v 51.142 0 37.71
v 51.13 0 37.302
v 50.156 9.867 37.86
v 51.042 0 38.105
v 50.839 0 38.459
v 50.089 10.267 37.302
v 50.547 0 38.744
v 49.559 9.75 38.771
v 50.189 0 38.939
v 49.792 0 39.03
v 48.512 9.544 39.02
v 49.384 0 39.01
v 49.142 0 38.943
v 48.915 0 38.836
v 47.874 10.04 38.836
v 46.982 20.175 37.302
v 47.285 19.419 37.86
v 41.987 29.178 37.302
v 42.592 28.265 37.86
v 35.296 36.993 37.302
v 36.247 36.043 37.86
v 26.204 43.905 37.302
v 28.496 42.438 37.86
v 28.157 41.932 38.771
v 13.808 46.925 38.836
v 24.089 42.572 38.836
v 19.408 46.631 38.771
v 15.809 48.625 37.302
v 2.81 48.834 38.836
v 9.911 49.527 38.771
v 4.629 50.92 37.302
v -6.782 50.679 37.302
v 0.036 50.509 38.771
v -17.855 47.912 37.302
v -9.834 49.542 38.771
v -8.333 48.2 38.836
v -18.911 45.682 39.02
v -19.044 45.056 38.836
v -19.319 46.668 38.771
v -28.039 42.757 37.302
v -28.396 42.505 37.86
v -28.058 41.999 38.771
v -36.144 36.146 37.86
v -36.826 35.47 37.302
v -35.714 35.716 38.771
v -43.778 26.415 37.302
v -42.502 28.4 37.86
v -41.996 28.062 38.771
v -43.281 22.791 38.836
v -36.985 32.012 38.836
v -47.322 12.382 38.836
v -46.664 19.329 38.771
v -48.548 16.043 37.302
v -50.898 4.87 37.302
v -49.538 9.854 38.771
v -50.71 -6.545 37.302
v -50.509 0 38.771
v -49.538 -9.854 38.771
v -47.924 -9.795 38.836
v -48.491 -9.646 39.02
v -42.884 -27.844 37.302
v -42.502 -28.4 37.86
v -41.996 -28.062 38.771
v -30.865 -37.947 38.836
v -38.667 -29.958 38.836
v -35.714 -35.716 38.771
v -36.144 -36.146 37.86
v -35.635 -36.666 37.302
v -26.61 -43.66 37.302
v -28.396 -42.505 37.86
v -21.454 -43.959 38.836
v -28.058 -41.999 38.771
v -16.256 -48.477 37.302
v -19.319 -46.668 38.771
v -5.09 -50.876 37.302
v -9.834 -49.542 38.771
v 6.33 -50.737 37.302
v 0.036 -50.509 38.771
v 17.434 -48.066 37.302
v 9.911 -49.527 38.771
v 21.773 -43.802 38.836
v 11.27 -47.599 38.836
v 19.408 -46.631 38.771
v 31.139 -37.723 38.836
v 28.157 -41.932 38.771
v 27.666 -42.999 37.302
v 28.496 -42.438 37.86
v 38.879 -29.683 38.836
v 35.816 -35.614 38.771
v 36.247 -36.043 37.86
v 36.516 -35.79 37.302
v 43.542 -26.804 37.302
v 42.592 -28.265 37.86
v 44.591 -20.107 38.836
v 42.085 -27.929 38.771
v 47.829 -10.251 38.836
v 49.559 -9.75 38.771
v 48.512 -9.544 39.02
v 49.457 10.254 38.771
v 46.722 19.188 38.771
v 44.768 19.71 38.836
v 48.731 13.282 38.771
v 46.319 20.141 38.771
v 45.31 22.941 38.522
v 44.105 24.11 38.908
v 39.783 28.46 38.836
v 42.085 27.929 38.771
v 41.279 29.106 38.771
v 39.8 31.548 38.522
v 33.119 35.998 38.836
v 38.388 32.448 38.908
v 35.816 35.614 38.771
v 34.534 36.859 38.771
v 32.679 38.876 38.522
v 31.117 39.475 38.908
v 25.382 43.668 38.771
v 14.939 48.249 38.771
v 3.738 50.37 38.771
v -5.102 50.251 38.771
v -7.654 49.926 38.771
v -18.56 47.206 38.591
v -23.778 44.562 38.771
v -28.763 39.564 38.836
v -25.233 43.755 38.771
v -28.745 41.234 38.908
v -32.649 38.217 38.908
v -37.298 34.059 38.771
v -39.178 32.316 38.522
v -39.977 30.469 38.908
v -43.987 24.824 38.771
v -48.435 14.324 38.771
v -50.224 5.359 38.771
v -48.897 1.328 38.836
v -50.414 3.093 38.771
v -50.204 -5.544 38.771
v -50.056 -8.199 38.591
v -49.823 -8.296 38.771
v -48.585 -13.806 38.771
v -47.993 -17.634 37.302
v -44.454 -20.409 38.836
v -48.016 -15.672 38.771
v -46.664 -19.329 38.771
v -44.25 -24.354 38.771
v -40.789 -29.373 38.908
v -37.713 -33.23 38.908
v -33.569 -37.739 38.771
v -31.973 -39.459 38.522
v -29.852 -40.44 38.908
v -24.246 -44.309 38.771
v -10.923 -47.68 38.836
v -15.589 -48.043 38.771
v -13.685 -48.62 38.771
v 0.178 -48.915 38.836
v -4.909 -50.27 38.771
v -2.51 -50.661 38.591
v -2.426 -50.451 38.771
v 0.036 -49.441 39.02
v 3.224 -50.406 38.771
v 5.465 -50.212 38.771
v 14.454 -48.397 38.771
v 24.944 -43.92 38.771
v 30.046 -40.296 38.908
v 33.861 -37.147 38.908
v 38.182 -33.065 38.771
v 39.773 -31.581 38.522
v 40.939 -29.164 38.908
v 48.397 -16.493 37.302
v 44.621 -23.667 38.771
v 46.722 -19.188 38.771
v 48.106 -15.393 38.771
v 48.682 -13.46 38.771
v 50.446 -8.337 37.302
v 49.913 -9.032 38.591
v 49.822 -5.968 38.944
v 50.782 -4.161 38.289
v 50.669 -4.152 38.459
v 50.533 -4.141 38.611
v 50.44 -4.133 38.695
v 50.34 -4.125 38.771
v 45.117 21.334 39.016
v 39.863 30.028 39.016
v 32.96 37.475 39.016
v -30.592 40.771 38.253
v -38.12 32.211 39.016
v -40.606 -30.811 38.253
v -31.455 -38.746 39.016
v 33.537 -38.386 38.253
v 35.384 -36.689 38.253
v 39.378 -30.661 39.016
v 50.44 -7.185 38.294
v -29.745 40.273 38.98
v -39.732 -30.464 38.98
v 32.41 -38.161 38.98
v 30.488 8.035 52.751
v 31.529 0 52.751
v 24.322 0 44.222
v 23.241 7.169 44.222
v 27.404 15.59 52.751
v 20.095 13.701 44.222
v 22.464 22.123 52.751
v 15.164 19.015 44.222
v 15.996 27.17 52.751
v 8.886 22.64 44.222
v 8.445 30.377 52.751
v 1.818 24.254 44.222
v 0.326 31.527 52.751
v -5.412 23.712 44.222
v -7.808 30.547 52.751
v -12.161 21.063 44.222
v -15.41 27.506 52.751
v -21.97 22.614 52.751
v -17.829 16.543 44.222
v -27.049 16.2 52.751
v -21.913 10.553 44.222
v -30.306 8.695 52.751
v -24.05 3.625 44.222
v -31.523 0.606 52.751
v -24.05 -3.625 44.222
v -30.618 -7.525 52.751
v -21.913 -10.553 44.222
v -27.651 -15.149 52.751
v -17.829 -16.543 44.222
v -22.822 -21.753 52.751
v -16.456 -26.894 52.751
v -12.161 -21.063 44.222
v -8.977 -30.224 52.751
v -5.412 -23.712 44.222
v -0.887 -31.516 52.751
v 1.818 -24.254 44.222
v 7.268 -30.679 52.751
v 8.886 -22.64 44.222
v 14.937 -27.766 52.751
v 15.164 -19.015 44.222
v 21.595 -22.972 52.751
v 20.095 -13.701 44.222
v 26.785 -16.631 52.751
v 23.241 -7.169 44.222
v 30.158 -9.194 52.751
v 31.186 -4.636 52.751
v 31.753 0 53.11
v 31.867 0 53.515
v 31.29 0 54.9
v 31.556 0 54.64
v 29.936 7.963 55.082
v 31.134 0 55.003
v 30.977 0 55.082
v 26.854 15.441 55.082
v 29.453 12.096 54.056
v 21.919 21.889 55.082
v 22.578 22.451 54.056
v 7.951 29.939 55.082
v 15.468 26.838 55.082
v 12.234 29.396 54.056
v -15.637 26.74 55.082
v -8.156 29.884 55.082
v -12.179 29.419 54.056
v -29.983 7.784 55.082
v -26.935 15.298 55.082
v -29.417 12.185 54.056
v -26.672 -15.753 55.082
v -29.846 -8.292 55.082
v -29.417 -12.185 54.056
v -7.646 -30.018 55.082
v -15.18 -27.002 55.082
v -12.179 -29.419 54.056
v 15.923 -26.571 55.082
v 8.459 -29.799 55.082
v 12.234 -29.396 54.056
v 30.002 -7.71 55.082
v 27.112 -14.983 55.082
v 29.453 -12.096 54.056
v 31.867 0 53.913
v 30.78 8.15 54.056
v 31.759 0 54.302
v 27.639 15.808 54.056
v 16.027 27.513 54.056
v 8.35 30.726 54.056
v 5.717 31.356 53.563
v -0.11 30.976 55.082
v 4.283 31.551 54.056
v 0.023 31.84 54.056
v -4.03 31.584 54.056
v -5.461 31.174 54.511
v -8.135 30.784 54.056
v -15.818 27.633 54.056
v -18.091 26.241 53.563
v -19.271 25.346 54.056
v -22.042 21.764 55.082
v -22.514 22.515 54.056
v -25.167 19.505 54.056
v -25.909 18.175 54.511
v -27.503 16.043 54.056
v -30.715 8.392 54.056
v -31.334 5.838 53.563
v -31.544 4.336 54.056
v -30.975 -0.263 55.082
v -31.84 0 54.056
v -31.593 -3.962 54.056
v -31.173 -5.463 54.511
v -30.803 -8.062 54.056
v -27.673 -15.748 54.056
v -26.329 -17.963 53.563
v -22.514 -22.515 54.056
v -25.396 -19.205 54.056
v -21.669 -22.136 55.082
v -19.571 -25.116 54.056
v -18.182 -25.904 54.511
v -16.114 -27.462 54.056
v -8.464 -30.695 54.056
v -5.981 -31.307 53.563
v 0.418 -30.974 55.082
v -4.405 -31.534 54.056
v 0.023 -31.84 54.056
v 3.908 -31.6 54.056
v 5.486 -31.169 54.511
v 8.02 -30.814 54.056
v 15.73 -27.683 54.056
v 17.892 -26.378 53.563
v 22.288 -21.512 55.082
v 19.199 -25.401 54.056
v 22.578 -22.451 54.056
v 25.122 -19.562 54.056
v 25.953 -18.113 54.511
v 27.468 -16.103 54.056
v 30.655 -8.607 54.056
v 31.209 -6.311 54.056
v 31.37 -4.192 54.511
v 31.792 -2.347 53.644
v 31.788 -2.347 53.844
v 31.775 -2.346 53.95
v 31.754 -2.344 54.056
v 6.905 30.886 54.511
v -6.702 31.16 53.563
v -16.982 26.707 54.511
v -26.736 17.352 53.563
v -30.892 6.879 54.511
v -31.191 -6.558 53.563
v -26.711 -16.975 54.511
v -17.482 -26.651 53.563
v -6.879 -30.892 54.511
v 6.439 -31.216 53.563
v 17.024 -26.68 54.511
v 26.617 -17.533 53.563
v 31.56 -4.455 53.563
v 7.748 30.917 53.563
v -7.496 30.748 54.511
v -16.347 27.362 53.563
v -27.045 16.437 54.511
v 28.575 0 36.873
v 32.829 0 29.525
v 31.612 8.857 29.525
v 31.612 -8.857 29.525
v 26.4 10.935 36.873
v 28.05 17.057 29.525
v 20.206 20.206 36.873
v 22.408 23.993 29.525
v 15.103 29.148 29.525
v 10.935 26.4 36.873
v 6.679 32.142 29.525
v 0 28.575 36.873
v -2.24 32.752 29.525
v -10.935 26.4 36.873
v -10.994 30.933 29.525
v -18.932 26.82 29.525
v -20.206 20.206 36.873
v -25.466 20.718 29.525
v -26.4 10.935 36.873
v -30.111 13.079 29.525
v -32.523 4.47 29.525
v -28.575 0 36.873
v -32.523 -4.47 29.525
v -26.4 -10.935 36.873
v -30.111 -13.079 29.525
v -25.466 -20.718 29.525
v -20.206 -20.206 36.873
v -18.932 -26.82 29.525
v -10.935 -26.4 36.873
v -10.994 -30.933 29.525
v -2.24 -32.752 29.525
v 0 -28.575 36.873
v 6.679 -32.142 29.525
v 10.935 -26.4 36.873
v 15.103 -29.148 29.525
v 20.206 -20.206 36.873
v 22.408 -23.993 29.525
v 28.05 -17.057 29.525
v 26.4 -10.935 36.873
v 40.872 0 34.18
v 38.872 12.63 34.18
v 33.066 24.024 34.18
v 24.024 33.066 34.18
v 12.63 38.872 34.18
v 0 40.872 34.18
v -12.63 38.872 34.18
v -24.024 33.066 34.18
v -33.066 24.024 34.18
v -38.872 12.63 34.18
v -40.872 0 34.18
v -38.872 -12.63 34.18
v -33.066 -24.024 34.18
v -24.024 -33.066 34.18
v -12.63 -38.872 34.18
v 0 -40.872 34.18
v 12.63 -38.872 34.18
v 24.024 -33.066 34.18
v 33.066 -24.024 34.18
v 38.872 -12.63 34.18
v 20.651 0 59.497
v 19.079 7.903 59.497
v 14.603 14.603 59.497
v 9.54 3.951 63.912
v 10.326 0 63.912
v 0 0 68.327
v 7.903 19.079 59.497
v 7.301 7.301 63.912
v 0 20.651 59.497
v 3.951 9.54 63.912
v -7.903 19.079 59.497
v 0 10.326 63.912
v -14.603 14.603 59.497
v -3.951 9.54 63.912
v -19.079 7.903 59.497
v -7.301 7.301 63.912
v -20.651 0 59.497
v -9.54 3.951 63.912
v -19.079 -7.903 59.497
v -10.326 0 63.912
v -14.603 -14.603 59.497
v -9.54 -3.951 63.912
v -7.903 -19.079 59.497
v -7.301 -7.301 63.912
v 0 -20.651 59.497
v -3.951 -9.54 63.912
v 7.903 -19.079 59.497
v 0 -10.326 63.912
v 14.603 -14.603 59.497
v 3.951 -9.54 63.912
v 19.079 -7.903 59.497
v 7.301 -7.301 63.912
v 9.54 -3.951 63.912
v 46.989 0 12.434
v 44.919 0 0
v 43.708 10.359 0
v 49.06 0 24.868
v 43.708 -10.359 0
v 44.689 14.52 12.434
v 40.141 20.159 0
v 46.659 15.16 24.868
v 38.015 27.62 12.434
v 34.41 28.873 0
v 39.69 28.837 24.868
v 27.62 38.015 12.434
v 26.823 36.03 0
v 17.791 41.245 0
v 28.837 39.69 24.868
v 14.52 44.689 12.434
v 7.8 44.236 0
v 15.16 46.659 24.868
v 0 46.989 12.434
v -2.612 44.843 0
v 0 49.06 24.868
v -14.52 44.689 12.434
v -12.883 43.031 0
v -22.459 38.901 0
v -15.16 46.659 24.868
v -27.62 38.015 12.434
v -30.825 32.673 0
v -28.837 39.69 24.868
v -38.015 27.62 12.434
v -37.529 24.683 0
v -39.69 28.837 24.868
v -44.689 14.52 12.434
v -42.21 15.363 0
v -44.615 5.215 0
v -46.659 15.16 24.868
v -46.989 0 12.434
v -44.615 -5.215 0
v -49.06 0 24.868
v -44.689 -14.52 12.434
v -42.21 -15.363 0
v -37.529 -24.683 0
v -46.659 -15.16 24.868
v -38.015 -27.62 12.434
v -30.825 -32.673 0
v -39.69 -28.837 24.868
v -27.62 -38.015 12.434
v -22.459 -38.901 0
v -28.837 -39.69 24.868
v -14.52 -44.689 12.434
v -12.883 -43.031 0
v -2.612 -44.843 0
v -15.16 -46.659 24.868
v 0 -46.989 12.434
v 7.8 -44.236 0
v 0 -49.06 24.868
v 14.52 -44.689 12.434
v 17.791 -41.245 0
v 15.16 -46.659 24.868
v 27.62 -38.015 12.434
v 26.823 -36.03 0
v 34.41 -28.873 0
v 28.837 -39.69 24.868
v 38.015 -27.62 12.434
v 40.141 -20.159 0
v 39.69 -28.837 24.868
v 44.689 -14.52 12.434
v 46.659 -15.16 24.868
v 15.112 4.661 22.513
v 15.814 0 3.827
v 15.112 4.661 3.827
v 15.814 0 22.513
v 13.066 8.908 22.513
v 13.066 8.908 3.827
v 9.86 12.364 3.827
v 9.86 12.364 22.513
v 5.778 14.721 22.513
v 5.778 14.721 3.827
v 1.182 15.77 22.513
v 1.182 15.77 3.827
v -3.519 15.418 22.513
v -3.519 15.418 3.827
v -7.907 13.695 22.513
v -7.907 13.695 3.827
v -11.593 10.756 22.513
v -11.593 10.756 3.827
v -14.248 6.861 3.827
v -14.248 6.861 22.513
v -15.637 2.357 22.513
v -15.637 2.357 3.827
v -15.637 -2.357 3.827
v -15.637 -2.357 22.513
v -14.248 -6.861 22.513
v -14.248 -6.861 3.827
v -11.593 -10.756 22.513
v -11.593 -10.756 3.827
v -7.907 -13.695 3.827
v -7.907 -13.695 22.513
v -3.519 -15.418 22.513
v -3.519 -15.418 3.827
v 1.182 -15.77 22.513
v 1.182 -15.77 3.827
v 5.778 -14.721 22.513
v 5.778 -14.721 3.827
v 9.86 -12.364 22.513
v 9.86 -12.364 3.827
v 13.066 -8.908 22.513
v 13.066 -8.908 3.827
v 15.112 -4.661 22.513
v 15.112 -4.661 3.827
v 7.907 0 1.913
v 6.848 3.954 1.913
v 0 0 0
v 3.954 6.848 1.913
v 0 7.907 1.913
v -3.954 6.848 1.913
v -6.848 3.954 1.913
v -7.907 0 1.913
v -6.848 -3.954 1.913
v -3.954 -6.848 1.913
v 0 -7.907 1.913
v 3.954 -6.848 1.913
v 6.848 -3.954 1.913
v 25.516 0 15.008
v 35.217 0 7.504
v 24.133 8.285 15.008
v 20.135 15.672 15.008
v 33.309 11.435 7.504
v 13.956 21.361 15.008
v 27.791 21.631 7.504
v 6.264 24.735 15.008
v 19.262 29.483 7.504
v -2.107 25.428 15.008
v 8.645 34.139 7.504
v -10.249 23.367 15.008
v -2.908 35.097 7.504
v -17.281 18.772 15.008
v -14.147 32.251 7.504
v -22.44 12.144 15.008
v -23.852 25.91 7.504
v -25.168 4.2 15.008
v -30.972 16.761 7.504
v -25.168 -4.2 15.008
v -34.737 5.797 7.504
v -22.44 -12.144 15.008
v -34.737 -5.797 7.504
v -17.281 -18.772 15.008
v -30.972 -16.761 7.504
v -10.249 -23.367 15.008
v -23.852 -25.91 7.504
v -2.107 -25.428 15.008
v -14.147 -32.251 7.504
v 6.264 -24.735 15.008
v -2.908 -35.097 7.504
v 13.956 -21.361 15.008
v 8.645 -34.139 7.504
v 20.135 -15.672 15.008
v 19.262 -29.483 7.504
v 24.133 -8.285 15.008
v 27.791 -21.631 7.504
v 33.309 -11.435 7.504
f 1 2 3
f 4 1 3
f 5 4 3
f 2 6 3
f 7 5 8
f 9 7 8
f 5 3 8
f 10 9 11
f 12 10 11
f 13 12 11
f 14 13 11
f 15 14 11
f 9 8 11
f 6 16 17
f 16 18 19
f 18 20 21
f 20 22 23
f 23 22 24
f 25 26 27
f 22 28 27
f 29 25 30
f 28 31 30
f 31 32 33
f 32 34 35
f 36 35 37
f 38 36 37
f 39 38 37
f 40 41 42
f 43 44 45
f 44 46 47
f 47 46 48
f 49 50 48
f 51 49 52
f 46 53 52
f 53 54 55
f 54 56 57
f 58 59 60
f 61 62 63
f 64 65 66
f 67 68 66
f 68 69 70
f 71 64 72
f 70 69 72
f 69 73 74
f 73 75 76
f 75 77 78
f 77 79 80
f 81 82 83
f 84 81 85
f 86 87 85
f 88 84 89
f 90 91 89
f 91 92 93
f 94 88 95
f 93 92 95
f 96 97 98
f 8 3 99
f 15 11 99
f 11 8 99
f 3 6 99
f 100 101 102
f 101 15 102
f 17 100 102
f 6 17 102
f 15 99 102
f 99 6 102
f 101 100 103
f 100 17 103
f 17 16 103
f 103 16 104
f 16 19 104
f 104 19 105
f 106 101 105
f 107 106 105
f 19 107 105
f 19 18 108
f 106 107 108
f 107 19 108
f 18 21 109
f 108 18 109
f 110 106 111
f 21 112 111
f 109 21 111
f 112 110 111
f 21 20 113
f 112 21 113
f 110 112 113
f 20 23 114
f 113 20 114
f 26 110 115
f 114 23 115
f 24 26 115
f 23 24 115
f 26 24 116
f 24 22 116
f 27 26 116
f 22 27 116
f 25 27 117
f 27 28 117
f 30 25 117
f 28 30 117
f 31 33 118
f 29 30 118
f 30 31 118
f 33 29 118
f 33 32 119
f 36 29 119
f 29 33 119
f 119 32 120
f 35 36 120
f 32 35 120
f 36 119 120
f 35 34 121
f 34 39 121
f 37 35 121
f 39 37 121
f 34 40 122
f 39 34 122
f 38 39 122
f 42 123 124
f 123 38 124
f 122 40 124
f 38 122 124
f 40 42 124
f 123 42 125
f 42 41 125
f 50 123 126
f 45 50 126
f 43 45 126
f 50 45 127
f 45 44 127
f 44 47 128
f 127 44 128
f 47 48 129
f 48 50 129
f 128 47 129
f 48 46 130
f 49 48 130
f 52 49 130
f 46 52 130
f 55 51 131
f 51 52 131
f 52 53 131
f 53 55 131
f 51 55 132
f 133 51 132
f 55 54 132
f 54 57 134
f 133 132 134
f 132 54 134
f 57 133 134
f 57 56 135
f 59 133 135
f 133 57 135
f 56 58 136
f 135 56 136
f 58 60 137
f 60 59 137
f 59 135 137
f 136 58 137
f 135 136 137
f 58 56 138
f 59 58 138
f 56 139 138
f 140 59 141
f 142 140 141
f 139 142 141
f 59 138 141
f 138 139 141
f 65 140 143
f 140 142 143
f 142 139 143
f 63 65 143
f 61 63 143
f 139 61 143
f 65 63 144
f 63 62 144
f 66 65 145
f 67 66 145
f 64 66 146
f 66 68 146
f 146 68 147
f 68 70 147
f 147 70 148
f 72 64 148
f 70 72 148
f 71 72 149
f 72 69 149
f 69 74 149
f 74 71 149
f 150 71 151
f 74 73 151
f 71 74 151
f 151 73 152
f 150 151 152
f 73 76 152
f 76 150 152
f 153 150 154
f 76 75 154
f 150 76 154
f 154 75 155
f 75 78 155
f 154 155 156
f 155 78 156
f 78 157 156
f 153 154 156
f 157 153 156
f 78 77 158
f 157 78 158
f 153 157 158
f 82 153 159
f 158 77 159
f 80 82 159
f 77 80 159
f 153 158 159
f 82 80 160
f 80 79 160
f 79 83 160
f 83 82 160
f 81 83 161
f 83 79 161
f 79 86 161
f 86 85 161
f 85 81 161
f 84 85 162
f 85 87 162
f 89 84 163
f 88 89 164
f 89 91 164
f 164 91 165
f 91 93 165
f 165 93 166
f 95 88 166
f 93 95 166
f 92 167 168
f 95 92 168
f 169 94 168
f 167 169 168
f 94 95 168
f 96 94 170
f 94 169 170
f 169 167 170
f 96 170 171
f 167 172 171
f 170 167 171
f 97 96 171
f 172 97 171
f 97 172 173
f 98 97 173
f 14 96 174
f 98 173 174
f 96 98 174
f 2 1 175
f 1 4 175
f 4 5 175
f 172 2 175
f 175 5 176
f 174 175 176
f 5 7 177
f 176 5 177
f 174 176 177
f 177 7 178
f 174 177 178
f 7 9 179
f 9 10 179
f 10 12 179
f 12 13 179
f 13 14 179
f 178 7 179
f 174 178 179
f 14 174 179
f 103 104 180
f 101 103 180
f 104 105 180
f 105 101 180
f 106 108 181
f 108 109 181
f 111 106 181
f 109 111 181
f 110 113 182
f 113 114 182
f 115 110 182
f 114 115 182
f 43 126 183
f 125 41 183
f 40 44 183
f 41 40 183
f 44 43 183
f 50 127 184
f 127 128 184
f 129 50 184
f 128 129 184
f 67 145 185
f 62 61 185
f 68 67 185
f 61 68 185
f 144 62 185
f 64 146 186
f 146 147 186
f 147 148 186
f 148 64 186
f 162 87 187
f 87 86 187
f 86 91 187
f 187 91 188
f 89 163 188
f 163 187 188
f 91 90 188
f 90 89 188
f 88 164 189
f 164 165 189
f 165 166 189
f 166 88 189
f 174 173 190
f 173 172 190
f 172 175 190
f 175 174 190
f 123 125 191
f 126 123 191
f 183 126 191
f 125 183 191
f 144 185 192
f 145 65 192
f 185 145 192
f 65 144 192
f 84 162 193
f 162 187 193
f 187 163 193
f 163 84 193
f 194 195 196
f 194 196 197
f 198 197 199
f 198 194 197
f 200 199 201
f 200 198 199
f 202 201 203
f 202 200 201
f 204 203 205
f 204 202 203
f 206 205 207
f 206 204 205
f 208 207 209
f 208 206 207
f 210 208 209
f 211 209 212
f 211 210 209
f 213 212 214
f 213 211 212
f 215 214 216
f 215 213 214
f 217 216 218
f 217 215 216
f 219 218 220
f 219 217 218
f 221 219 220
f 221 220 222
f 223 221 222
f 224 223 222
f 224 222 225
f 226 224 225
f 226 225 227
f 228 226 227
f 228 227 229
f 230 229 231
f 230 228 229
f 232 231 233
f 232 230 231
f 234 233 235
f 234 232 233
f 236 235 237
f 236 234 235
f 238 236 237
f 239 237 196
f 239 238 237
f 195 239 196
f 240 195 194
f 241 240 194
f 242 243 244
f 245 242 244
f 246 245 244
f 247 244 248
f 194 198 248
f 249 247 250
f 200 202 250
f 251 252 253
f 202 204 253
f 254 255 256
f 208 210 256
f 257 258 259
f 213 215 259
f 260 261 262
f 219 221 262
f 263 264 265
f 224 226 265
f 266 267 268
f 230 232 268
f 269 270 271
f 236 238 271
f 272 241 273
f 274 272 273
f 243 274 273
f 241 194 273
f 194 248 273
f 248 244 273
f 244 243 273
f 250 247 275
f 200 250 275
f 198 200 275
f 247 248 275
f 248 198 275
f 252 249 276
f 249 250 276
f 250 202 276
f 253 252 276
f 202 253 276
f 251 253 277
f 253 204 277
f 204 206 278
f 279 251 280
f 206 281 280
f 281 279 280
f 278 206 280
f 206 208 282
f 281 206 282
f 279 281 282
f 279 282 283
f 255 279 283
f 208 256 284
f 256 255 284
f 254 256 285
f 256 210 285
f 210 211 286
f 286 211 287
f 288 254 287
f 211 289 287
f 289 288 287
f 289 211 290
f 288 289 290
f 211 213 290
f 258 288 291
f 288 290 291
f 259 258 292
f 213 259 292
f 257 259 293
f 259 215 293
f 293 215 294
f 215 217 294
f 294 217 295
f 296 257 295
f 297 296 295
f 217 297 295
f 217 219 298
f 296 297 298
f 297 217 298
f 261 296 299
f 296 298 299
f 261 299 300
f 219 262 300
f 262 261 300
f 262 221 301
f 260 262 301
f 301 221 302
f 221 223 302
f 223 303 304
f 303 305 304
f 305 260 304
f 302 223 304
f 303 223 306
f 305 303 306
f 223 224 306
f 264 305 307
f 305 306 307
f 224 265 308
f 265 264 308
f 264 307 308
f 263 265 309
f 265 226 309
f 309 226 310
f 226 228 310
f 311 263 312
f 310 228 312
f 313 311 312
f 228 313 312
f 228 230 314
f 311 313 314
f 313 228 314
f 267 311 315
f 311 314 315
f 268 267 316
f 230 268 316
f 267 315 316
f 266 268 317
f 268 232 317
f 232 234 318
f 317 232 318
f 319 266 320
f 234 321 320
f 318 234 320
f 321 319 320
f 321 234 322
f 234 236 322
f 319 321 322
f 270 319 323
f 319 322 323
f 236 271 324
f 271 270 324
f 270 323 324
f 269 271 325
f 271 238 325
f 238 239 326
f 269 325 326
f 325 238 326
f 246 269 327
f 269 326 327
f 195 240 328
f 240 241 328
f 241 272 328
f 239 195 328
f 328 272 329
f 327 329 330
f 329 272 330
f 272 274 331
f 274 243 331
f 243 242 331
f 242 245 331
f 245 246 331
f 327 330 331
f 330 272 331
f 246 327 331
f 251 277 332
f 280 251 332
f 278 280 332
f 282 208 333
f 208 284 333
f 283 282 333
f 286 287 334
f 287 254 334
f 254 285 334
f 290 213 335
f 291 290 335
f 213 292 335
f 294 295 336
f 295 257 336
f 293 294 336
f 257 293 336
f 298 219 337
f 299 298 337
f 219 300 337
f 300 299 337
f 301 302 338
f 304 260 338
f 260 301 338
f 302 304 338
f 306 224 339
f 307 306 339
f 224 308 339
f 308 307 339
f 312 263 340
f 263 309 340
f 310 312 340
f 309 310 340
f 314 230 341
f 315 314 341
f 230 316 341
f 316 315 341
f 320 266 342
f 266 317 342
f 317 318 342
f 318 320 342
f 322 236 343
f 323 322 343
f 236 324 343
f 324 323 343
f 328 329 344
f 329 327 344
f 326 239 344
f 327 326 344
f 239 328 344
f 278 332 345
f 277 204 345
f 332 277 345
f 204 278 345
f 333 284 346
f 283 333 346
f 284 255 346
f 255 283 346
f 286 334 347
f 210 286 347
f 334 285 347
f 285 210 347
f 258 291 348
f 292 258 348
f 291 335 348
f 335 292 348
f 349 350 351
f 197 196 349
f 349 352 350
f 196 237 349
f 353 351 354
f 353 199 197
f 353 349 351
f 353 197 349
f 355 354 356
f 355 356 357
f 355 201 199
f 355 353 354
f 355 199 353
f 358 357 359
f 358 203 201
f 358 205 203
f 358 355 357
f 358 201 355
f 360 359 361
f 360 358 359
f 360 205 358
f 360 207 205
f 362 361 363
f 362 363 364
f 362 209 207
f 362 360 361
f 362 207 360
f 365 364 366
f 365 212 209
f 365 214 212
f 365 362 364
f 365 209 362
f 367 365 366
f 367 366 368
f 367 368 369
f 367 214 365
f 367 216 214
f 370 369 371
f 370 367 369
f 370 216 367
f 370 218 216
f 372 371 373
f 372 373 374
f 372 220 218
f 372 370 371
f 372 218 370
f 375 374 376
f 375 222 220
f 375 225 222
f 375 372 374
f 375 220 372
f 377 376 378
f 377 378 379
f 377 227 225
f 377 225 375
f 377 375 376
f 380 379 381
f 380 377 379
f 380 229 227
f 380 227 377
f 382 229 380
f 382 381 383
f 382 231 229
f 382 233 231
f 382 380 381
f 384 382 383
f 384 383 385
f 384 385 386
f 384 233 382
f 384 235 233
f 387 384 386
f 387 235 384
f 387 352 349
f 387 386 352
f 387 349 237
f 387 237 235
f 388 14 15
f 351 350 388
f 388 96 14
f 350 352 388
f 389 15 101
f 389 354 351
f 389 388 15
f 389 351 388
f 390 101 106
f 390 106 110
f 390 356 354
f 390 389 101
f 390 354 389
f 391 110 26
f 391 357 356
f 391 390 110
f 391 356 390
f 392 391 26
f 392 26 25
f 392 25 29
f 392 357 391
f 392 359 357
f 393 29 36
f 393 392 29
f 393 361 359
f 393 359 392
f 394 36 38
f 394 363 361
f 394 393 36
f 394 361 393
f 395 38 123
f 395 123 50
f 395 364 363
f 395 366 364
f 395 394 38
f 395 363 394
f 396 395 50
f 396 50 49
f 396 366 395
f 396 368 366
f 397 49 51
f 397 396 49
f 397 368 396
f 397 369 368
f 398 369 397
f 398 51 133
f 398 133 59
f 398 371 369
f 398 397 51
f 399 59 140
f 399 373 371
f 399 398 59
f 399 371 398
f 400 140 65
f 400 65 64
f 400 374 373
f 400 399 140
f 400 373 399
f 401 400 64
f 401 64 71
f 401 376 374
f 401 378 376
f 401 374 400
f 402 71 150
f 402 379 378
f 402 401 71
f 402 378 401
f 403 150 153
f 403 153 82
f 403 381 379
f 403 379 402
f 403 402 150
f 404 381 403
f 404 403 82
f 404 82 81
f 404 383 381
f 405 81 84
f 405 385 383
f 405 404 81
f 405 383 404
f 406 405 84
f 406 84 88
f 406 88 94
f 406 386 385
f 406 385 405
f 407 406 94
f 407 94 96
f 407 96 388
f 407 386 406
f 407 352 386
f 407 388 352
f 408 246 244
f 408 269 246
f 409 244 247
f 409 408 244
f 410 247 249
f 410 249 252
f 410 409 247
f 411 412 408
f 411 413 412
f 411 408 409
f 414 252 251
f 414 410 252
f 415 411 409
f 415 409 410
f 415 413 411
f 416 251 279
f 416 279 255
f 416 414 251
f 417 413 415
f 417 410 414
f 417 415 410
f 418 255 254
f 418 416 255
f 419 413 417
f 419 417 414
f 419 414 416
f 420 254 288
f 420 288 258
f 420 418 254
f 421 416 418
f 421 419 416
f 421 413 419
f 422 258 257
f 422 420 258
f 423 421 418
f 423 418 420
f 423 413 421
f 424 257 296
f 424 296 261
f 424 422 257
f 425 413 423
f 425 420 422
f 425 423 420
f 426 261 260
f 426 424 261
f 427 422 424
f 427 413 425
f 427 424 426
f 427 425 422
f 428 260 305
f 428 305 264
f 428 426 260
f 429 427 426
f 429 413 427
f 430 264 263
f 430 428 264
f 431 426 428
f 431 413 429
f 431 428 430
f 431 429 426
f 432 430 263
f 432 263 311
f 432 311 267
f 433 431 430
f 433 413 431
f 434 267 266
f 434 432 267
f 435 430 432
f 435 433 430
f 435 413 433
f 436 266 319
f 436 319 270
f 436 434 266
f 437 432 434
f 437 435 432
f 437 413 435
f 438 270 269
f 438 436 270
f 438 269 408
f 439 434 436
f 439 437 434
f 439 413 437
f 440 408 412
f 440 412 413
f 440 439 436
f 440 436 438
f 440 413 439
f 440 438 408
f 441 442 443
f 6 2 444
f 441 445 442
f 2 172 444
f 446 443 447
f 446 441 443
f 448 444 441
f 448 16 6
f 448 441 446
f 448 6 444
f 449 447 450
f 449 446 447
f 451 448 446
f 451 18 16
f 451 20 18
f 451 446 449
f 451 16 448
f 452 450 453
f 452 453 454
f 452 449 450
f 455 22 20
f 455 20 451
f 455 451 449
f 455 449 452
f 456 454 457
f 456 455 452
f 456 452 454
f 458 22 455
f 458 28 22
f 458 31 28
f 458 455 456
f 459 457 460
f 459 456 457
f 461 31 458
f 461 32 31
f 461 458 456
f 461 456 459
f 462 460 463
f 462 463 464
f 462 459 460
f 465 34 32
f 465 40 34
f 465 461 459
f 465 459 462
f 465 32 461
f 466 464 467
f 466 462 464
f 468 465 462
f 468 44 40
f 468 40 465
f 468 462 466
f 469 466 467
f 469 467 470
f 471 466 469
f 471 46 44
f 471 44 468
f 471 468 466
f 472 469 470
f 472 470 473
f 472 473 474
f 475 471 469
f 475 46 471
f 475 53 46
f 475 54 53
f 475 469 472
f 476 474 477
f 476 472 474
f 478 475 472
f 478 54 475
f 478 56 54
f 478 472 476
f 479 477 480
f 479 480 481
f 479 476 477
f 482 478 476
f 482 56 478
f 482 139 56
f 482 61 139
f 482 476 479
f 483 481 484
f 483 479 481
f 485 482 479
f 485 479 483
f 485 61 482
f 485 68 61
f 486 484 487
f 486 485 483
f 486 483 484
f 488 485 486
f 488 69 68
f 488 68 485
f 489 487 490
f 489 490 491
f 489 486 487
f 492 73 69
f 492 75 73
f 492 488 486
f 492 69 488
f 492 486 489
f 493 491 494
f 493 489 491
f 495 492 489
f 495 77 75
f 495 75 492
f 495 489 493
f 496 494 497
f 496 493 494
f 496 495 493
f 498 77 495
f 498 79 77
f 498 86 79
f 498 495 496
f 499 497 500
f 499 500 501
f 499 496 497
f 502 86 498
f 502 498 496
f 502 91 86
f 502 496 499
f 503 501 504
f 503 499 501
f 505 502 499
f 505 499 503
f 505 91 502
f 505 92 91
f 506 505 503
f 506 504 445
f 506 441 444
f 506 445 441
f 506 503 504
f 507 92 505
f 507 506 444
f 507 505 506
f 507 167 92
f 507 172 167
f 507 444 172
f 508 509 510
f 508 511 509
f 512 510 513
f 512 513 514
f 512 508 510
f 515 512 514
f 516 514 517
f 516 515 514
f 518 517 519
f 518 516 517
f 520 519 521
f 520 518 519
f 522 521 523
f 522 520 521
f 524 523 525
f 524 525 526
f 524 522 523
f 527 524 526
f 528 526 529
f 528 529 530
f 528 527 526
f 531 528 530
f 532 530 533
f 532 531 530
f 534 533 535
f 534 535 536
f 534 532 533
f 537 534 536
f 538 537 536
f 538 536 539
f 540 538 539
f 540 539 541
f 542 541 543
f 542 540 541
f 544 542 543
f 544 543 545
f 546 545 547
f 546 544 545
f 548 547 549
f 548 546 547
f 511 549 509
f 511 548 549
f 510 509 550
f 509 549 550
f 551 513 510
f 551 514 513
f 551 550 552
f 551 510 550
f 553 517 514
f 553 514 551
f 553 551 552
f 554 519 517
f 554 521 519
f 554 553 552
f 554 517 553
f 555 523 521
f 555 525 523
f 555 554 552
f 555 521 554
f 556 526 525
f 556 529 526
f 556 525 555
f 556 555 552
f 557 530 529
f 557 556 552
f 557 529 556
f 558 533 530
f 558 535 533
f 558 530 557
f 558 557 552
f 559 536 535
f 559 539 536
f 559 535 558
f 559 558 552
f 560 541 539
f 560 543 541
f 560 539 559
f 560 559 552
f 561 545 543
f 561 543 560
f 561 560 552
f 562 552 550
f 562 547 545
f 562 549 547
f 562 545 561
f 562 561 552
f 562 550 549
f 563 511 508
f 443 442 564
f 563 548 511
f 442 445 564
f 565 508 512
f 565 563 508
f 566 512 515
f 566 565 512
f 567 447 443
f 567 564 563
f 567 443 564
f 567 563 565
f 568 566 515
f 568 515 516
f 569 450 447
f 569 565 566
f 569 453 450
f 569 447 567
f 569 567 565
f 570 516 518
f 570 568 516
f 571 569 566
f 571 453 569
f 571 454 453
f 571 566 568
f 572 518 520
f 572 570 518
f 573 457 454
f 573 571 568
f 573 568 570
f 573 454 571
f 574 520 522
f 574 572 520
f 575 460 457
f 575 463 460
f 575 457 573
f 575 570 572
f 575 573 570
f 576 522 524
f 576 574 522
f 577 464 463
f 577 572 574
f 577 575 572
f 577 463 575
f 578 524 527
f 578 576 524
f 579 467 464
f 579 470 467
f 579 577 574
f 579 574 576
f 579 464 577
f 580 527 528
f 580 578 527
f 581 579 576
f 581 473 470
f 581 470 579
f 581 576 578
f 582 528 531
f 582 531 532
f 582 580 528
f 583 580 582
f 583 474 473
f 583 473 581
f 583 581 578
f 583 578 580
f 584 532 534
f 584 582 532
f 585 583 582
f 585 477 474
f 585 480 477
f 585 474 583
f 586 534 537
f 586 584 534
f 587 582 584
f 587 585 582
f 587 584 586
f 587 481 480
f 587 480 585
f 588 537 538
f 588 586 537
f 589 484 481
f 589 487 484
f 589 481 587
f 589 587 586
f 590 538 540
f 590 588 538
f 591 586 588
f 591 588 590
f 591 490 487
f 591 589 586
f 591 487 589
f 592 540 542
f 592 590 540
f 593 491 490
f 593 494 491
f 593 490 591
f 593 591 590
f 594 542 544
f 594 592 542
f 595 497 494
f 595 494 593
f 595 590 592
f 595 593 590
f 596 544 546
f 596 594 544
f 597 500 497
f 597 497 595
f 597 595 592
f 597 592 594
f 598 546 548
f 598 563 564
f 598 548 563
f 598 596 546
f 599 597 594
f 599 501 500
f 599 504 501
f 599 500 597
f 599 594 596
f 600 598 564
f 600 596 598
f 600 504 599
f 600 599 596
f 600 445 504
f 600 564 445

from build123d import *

# Parameters (mm, degrees)
F2_R = 1.489474


with BuildPart() as f1:
    # F0 (on Front) → F1 (revolve)
    with BuildSketch(Plane.XZ):
        Polygon((0, 68.326987), (0, 0), (15.814129, 3.826638), (15.814129, 22.512592), (44.918541, 0), (51.649282, 40.418446), (32.829016, 29.524632), (24.321577, 44.222172), (32.829016, 54.289982), align=None)
    revolve(axis=Axis((0, 0, 34.163494), (0, 0, 1)))

    # F2
    f2_edges = [f1.edges().sort_by_distance(p)[0] for p in [
        (-51.649282, 0, 40.418446),
        (-32.829016, 0, 54.289982),
    ]]
    fillet(f2_edges, radius=F2_R)


solid = f1.part
